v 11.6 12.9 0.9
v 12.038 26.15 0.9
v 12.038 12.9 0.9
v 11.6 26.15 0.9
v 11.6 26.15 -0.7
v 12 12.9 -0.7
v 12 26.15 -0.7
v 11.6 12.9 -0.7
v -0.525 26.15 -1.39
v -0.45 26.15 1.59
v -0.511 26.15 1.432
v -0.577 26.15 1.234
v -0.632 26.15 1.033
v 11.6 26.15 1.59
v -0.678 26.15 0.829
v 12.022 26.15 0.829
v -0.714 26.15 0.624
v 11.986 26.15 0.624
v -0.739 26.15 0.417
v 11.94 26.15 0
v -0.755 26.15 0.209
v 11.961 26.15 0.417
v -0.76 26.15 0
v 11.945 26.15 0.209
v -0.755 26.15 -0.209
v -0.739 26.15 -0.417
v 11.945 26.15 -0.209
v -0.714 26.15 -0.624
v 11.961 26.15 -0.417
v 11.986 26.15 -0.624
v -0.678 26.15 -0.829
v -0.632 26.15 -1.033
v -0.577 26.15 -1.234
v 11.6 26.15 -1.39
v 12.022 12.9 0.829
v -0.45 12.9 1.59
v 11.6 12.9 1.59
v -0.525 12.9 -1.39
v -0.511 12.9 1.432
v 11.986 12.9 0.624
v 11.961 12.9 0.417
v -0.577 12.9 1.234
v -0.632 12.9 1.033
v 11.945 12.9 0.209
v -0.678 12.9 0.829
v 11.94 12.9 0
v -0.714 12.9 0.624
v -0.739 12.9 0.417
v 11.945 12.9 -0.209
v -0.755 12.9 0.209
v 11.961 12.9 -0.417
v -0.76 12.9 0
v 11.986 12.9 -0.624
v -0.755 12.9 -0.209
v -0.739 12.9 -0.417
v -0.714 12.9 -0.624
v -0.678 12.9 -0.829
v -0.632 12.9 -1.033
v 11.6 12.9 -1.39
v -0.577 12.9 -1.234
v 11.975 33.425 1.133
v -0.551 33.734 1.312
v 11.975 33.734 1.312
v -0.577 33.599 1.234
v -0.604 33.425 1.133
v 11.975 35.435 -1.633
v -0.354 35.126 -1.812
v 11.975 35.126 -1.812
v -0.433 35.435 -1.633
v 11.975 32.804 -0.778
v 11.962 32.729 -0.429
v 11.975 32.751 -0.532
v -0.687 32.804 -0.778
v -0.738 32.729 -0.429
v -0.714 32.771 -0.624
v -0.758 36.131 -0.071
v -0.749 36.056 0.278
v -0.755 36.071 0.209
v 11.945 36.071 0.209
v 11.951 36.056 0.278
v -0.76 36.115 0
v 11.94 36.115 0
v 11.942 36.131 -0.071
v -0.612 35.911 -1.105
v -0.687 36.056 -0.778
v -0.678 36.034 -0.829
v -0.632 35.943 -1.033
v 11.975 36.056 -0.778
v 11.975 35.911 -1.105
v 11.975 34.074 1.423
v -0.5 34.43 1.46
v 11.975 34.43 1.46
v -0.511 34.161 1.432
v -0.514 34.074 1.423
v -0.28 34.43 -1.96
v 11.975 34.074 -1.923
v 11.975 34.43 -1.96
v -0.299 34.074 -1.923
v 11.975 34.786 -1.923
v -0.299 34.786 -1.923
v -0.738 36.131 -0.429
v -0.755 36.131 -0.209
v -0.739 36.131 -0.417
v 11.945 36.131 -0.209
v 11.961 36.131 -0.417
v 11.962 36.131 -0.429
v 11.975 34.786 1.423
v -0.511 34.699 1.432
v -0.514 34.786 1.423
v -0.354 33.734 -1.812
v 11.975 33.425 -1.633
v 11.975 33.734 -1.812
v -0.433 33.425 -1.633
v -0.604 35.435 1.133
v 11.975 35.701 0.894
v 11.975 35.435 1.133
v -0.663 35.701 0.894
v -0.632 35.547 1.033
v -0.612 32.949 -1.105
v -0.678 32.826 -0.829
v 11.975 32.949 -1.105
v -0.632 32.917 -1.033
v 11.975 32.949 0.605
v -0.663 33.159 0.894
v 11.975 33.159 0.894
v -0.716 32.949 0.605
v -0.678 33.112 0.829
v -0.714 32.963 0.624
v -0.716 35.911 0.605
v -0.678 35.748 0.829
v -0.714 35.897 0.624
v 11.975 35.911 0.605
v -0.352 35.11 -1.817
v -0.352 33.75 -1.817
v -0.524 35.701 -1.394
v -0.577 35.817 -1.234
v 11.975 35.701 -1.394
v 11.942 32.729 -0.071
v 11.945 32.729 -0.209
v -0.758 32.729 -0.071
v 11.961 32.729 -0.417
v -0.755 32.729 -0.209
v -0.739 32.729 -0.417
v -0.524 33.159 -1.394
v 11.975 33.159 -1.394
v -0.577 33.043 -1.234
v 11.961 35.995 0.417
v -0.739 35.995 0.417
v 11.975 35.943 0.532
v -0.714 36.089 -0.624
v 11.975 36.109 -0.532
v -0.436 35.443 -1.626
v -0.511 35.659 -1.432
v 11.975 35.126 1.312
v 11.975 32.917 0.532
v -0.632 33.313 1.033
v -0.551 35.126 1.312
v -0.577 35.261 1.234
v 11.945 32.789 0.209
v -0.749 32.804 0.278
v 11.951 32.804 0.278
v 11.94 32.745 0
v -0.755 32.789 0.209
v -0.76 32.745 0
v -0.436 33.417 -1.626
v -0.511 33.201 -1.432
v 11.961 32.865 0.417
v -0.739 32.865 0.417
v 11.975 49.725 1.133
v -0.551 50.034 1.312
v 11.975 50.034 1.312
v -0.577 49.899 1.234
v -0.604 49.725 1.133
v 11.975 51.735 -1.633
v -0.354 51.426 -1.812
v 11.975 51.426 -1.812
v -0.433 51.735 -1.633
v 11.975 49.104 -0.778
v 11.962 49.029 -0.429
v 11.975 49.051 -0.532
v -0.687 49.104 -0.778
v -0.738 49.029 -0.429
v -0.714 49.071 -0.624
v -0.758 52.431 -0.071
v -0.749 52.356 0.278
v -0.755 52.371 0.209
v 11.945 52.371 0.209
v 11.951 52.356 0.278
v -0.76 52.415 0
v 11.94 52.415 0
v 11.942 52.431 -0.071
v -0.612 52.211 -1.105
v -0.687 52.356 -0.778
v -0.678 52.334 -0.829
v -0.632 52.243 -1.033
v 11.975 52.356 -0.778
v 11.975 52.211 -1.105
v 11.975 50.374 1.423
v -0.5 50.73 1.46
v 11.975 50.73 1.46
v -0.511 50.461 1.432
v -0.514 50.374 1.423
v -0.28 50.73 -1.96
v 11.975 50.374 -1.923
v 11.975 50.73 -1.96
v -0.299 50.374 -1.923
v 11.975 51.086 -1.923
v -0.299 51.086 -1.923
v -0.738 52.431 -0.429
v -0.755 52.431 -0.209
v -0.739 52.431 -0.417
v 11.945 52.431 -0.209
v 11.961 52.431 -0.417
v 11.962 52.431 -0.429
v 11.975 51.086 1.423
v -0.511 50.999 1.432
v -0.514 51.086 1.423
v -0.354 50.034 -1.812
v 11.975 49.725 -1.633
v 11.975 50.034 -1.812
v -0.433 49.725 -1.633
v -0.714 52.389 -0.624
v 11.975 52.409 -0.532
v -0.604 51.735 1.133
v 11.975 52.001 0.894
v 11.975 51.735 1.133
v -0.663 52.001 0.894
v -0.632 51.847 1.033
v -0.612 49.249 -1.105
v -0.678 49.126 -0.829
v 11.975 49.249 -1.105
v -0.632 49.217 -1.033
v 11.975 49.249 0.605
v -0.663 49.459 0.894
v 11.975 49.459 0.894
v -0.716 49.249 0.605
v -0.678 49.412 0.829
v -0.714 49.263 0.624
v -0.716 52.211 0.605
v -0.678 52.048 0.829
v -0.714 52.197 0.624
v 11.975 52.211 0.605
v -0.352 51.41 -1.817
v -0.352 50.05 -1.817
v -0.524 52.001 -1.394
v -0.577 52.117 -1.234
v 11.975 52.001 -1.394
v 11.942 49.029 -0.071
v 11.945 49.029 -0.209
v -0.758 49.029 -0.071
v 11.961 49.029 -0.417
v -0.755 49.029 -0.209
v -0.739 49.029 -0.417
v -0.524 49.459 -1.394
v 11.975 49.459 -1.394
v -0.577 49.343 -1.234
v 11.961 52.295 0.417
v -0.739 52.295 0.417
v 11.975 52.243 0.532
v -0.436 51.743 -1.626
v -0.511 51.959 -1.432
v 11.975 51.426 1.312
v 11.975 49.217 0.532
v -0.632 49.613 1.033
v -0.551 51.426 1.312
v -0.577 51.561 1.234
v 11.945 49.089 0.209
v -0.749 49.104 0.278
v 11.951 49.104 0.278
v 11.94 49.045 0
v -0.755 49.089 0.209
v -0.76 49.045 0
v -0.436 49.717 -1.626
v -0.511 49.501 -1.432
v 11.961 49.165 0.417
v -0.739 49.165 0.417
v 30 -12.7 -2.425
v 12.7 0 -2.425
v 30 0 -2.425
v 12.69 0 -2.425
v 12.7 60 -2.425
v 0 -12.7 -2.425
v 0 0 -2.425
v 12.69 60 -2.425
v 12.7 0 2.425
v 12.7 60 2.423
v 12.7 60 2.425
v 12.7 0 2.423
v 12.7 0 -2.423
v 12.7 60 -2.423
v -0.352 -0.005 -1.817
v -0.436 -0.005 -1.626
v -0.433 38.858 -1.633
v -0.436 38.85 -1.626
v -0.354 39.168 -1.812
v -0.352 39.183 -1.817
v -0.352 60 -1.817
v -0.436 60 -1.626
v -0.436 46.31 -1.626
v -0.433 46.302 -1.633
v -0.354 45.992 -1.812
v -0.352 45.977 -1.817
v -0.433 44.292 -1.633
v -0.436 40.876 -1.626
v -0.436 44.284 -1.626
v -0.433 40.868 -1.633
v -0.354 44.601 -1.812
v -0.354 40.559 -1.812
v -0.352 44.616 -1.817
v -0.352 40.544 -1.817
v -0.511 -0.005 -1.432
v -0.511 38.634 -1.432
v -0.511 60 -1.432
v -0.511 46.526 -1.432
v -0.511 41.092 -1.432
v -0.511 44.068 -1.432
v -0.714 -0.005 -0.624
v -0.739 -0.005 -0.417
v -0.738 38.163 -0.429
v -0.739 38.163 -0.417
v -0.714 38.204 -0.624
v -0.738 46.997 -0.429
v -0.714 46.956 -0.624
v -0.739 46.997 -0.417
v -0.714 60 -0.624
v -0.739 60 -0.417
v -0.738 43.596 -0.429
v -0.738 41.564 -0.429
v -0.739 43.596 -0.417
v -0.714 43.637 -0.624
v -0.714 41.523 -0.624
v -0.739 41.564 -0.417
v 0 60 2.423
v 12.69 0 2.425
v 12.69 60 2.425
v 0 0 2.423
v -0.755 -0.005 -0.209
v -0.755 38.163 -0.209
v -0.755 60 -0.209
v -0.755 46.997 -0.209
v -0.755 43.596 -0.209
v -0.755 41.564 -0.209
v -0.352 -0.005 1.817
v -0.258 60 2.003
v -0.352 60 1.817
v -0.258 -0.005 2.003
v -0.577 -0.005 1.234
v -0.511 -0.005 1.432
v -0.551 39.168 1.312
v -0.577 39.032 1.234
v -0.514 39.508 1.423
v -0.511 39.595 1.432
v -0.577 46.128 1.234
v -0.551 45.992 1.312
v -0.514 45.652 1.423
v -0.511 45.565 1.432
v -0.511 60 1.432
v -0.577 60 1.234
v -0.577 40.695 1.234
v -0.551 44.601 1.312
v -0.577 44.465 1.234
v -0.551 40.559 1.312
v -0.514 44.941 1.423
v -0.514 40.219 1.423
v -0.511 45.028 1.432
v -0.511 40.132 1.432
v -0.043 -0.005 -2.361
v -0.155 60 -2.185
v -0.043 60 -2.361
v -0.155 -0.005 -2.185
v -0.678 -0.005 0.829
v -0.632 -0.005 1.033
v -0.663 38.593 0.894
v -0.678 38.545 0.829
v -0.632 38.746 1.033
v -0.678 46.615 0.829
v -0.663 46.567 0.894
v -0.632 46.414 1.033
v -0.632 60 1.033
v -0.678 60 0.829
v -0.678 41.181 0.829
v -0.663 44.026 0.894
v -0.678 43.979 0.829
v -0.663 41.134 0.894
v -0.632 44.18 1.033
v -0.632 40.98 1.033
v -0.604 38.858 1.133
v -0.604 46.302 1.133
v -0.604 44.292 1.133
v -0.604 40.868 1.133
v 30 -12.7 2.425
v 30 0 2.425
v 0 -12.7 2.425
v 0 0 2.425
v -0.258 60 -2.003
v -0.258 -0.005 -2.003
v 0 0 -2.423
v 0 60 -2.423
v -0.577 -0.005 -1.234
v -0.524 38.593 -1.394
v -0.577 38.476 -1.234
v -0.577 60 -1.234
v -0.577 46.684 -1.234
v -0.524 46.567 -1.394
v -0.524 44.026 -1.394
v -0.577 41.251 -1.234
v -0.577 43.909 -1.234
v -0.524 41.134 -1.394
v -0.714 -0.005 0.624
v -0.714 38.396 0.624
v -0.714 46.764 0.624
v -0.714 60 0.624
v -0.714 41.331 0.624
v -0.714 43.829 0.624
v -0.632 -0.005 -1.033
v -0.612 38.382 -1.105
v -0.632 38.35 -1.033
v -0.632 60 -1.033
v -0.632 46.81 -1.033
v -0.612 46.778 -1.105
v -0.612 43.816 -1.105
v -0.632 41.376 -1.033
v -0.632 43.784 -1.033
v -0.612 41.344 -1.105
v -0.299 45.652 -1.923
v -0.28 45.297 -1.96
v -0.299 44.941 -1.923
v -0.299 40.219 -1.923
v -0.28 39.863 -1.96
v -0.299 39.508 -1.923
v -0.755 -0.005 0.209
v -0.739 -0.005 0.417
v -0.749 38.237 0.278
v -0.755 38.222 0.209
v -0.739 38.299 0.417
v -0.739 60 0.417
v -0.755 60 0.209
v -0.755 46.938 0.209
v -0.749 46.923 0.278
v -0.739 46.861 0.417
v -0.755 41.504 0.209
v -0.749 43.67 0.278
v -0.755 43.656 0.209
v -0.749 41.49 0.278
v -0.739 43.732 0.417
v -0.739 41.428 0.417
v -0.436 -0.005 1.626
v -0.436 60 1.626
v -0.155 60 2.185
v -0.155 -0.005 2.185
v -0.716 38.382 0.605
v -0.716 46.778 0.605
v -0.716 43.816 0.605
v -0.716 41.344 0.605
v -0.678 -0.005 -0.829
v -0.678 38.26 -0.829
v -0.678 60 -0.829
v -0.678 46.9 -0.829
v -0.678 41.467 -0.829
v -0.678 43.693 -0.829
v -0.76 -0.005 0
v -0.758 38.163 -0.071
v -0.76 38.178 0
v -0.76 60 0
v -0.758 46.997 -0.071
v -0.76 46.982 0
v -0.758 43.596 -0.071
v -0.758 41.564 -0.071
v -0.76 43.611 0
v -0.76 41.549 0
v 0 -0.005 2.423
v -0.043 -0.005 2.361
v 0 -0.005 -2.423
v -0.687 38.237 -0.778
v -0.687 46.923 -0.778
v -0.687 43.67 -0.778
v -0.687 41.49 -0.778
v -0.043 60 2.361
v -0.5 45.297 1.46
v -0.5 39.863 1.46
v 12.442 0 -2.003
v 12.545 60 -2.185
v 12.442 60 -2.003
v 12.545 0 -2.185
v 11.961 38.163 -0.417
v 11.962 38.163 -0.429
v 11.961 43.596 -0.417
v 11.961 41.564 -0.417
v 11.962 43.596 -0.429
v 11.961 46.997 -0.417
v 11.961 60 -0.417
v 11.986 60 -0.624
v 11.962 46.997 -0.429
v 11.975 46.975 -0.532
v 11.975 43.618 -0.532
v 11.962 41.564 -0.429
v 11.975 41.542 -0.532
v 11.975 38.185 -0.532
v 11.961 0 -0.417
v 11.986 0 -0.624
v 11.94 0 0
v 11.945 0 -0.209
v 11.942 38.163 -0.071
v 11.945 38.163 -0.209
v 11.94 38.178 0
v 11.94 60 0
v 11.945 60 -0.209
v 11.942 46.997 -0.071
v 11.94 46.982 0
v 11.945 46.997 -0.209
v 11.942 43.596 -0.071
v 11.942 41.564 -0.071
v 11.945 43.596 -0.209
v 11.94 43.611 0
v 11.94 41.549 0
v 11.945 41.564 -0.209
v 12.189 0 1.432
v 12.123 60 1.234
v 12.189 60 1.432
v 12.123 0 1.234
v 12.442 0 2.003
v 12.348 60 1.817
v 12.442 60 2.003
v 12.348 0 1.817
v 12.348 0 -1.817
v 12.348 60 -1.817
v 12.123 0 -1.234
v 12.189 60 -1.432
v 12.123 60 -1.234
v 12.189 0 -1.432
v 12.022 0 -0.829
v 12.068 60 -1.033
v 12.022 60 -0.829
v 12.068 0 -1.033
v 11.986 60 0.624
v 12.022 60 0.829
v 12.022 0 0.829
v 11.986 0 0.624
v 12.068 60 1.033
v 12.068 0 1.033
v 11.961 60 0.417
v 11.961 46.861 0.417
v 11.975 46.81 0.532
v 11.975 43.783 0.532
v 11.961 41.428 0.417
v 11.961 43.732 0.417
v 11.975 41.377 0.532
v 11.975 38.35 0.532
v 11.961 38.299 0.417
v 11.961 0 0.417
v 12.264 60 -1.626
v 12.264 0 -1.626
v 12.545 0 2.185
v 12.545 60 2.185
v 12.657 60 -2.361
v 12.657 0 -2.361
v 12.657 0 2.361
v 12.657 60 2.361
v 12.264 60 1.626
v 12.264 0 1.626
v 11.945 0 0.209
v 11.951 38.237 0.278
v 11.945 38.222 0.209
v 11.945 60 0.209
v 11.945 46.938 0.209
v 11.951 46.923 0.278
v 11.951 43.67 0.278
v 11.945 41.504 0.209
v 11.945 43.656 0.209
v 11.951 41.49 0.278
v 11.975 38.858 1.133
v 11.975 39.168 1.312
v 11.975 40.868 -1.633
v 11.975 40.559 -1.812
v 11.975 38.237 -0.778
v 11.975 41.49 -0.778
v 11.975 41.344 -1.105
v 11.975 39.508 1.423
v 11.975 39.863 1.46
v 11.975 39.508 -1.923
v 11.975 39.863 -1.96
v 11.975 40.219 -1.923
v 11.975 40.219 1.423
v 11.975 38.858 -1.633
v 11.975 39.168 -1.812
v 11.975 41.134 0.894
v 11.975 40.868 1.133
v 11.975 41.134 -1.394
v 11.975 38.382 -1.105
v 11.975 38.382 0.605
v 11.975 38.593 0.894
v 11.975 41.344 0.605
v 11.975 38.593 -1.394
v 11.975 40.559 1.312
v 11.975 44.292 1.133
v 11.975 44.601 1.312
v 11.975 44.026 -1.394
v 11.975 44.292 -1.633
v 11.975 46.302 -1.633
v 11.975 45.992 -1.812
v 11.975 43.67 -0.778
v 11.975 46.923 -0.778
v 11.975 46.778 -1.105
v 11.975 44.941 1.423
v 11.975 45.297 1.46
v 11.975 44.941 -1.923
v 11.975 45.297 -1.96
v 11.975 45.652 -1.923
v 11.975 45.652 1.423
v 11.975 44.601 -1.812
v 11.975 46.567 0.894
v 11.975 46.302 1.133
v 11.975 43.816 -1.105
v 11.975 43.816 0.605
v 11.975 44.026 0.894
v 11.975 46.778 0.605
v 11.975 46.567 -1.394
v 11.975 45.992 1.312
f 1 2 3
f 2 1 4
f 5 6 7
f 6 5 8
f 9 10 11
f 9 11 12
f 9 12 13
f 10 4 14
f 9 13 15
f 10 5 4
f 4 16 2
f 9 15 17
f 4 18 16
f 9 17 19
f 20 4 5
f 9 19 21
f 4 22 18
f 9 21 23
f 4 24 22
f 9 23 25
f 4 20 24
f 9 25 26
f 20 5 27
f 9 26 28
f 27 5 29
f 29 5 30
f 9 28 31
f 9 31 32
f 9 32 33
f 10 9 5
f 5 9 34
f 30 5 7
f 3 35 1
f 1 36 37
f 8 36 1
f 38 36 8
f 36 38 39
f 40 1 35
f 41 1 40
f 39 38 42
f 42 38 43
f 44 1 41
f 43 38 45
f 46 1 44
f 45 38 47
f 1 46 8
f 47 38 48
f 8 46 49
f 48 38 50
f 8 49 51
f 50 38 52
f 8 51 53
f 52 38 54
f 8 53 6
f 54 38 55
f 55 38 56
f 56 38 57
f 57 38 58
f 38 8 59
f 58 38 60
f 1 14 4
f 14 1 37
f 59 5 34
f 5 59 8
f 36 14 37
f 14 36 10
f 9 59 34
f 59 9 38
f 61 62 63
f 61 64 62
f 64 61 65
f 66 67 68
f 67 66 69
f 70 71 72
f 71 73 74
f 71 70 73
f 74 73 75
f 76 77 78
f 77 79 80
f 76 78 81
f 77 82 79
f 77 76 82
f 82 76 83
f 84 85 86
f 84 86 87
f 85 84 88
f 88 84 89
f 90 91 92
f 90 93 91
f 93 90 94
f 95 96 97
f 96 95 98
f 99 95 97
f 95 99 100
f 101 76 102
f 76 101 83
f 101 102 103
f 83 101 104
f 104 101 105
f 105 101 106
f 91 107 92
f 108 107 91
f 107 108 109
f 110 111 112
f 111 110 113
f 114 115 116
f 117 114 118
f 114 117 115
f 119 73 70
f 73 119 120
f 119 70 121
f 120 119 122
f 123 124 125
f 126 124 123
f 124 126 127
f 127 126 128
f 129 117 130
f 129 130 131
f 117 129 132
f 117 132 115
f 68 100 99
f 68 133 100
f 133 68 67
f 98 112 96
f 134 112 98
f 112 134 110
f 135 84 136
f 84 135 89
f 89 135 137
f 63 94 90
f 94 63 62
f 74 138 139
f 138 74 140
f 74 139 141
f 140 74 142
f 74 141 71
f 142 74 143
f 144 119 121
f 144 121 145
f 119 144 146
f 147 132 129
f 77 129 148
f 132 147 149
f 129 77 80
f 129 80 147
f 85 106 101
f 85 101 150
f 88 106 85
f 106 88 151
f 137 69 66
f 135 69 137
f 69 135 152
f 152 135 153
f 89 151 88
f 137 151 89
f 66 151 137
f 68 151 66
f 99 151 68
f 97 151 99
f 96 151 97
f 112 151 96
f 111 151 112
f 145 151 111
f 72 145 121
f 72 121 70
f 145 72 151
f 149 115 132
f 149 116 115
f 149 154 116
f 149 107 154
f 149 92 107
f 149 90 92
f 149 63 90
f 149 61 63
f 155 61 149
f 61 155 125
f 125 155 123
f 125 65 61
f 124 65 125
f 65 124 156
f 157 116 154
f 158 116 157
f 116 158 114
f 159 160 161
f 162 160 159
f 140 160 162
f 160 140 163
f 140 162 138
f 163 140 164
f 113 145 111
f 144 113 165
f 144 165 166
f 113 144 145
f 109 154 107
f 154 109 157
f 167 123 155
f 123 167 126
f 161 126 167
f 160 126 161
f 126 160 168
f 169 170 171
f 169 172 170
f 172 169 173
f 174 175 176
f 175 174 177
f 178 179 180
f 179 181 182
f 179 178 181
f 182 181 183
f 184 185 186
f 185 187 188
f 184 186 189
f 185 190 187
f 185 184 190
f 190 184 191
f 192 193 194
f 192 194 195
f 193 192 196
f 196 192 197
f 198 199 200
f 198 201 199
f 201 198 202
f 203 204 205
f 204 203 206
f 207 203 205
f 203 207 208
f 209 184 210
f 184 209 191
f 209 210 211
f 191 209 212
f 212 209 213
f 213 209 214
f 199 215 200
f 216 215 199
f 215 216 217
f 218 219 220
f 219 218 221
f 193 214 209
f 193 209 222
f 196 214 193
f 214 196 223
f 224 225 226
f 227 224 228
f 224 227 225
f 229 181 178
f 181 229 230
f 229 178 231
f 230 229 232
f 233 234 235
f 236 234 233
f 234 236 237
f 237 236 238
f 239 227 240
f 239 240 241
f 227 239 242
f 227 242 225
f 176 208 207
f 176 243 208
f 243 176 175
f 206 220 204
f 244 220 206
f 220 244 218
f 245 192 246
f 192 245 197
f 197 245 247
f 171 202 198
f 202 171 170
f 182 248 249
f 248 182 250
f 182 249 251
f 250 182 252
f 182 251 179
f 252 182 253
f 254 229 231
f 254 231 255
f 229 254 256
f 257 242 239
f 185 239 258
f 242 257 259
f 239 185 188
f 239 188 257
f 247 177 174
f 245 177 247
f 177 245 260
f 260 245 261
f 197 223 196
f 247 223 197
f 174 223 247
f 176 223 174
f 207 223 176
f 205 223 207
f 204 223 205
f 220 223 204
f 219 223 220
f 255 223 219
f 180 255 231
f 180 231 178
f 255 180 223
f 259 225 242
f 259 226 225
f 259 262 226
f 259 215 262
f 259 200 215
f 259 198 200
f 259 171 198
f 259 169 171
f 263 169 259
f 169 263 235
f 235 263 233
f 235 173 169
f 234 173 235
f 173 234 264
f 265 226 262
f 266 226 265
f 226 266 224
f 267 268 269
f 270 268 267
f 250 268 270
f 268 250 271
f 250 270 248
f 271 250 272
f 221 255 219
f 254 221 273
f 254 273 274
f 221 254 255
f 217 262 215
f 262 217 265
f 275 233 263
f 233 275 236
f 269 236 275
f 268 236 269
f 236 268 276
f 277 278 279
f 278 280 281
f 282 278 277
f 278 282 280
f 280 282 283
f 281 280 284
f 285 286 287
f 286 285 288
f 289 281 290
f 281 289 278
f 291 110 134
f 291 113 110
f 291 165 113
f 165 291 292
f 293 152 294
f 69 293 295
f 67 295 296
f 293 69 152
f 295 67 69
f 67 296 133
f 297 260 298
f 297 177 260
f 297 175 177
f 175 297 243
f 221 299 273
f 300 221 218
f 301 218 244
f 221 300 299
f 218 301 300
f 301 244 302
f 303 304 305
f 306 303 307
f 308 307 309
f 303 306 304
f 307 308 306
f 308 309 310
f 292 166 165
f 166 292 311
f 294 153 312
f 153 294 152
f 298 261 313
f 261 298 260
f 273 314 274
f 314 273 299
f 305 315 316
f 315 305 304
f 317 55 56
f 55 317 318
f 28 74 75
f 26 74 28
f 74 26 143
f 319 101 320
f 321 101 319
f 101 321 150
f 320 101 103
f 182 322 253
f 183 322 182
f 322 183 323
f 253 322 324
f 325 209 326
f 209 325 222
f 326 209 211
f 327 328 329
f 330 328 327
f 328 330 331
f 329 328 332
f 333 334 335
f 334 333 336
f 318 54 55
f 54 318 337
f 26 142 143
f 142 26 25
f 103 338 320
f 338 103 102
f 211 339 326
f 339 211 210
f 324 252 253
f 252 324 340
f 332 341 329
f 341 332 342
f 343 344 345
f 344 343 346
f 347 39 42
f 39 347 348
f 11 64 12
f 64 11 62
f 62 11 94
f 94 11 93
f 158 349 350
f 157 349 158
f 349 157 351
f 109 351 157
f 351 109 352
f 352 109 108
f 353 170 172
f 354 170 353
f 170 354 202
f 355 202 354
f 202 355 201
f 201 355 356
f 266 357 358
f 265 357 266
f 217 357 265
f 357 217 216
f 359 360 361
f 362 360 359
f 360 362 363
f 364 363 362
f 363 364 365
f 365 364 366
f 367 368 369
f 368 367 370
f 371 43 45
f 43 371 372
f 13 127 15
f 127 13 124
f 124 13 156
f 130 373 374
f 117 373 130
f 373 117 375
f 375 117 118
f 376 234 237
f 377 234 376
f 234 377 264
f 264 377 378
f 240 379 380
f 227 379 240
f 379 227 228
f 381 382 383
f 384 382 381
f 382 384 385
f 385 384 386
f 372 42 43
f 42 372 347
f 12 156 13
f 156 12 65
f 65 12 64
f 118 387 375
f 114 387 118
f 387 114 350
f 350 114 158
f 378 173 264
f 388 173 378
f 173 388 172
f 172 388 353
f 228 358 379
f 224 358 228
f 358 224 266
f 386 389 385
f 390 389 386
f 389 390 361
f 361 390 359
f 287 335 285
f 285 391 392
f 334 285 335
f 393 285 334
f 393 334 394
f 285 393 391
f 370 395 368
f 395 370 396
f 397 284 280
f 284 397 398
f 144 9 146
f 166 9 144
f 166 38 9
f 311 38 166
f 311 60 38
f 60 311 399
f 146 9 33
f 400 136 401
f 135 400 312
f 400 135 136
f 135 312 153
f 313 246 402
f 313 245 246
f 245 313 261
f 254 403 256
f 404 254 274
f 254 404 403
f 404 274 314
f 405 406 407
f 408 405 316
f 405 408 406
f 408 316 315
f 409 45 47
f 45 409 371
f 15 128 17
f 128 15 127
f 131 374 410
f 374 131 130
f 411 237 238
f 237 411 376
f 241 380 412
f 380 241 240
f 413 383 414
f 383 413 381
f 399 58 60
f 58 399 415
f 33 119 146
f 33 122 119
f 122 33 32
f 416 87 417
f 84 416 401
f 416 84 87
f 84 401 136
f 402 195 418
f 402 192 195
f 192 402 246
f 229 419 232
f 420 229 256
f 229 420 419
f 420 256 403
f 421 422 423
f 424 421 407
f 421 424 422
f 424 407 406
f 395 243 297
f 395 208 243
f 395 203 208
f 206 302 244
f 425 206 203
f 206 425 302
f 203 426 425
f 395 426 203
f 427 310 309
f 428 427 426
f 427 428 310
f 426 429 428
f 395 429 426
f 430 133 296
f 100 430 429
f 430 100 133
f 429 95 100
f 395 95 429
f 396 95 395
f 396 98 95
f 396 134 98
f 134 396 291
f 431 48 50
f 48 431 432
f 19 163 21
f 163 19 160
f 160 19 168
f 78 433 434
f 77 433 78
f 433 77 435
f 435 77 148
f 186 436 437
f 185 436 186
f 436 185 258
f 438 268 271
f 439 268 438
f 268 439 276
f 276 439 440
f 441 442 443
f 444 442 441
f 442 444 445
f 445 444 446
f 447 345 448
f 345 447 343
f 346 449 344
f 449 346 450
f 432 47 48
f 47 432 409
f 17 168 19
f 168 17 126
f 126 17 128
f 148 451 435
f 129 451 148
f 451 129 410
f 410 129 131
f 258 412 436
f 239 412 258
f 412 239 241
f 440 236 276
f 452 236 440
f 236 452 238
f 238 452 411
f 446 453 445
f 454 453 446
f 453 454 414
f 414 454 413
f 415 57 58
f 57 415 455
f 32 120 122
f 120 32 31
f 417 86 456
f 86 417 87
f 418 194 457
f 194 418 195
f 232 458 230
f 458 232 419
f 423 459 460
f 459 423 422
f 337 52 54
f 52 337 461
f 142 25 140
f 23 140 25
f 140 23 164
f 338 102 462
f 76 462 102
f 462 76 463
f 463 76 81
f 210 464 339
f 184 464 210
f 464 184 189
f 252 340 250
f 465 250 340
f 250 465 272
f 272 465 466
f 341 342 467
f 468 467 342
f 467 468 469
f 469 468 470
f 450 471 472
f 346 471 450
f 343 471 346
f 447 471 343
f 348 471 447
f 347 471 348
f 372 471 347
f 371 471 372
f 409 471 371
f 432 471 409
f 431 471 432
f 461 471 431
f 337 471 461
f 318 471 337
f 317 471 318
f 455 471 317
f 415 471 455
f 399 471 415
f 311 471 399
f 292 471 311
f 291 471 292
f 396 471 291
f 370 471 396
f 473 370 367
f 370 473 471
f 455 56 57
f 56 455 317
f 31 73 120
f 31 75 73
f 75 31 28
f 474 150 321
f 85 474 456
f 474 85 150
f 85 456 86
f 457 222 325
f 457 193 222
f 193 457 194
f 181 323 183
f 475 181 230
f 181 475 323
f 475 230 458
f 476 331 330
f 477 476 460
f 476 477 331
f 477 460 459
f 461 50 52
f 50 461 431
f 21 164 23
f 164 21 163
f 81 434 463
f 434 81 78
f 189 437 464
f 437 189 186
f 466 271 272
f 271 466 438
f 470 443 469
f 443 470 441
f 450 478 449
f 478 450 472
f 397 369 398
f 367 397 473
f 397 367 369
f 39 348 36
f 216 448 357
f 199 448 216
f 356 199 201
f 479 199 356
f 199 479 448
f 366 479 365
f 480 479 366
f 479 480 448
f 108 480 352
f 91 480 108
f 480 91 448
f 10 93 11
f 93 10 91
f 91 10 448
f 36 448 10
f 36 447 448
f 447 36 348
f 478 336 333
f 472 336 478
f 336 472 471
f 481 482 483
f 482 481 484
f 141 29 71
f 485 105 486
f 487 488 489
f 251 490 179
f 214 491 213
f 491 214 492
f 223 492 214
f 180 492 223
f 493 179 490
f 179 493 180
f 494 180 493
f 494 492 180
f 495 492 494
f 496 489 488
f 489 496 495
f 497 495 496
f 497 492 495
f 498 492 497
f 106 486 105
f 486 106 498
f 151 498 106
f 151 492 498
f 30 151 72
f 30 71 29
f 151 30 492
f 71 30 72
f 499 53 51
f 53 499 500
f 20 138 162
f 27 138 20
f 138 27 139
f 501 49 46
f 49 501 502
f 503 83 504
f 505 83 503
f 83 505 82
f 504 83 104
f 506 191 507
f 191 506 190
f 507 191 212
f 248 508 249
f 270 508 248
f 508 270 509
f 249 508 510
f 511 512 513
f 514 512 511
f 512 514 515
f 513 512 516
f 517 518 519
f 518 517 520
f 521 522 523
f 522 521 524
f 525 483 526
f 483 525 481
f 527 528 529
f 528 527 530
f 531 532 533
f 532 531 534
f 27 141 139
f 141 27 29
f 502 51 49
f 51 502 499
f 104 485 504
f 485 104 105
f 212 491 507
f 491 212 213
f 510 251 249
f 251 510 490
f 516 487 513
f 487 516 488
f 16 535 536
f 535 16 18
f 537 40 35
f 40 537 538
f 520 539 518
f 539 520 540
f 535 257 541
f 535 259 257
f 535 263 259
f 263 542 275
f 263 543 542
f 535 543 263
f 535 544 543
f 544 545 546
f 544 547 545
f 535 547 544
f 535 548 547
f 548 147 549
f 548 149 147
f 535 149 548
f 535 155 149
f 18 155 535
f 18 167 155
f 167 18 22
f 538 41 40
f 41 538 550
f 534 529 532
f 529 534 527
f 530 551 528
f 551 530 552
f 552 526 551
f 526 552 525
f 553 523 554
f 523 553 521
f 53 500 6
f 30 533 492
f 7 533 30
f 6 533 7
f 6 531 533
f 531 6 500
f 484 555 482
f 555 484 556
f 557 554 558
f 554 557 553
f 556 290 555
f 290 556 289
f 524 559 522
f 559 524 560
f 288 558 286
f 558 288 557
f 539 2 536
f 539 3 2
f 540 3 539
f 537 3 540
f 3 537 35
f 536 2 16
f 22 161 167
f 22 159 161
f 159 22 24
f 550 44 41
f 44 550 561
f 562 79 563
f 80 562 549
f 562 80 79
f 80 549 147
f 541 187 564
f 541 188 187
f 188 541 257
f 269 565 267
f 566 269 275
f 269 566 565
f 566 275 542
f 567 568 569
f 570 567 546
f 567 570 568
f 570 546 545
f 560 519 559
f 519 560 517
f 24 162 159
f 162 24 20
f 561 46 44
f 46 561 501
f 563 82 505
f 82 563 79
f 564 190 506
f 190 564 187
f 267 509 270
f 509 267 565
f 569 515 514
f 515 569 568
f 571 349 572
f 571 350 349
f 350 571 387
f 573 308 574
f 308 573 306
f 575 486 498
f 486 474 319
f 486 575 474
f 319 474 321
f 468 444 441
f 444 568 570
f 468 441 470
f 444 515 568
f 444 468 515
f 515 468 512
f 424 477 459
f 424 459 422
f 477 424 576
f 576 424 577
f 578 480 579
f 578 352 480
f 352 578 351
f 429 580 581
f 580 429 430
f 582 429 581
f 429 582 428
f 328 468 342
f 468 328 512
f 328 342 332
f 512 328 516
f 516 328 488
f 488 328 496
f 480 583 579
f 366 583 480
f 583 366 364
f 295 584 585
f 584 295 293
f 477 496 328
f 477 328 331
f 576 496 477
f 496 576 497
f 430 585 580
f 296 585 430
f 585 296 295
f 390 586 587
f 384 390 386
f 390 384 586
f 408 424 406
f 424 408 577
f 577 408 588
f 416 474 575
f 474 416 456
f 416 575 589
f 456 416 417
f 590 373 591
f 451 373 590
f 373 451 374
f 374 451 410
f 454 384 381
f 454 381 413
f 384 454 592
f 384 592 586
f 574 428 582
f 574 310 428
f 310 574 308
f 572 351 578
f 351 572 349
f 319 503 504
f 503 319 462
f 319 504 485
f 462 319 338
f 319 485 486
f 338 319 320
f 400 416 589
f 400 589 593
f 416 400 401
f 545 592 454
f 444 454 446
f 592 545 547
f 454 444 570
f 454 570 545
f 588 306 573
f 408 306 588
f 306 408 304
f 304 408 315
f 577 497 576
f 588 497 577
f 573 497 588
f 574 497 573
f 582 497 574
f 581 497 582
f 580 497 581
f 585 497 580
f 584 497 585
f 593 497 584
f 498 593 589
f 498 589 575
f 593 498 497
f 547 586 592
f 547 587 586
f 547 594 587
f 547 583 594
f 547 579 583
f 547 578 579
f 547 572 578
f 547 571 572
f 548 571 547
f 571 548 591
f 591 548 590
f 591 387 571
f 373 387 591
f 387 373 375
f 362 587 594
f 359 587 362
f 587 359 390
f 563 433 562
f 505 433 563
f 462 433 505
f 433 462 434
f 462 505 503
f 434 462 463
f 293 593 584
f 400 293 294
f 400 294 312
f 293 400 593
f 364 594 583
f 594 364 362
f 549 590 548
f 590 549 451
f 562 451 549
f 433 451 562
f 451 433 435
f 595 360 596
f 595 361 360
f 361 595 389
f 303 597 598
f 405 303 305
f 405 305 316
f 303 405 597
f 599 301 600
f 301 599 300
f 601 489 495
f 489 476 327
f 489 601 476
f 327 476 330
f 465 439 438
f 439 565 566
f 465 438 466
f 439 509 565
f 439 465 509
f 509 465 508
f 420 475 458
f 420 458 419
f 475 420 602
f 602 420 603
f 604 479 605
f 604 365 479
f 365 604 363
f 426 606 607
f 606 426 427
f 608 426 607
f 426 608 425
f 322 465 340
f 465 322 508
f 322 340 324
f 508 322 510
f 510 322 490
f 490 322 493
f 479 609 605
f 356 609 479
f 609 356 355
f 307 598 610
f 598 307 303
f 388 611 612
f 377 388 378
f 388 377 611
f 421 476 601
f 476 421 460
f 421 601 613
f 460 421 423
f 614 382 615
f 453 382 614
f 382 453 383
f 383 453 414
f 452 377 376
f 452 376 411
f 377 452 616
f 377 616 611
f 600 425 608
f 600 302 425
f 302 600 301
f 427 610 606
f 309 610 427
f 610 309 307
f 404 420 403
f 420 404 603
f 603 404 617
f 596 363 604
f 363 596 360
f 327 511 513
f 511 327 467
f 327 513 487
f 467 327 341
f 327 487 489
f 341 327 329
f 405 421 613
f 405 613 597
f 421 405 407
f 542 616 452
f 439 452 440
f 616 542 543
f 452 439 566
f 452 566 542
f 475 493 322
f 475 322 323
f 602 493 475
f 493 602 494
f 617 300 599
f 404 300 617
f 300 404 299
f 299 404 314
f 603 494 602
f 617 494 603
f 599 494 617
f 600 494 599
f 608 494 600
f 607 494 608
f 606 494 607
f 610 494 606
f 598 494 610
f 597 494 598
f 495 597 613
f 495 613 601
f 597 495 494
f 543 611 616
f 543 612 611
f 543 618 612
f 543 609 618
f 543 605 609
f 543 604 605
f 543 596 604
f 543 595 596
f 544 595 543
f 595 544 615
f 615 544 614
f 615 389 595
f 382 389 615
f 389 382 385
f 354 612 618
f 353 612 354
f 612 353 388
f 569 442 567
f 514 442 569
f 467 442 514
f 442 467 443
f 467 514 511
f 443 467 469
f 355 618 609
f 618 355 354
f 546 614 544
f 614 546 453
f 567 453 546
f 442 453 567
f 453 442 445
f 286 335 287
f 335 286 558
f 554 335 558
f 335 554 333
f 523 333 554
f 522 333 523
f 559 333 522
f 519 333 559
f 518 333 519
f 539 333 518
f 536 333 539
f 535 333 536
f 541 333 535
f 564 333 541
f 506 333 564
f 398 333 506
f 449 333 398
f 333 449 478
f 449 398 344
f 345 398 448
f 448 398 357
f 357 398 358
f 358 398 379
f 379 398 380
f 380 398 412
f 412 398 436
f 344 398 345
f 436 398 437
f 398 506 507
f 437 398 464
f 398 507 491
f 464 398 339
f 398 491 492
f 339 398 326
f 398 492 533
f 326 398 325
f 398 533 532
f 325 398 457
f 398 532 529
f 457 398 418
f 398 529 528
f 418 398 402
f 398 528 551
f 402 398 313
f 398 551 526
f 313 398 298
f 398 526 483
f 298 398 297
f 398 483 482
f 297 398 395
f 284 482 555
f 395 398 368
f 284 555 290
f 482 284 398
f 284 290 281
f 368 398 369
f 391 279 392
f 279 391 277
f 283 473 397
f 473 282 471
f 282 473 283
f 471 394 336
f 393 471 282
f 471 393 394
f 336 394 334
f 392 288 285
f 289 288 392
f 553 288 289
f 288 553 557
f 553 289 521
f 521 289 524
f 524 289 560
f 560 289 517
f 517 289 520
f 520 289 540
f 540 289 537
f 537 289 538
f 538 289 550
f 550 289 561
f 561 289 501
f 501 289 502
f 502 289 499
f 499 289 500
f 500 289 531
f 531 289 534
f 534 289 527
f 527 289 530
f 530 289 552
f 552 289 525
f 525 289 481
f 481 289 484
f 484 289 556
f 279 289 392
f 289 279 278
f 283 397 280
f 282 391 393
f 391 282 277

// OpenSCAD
MM_PER_IN = 25.4;
RESOLUTION = 0.01; // 0.01 mm slices (too small to matter)
PRINT_TOLERANCE = 0.15; // mm

RIB_WIDTH = MM_PER_IN / 2; // 1/4" in mm
RM2_LENGTH = 246; // mm
RM2_THICKNESS = 4.7 + PRINT_TOLERANCE; // mm
RM2_CURVE_RAD = 4.25; // mm

module genCurveShape(
    radius = RM2_CURVE_RAD,
    height = RM2_THICKNESS,
    thickness = RESOLUTION,
  ) {

  width = radius - sqrt(pow(radius, 2) - pow((height / 2), 2));

  rotate([90,0,0])
  // "center" the part 3-dimensionally
  translate([radius - (width), 0, -thickness / 2])
  linear_extrude(thickness)
  intersection() {
    circle(r=radius, $fn = 128, center = true);
    translate([-radius + width / 2, 0, 0])
      square(size = [width, height], center = true);
  }
}

// Not currently used
module genInverseCurveShape(
    radius = RM2_CURVE_RAD,
    height = RM2_THICKNESS
  ) {

  width = radius - sqrt(pow(radius, 2) - pow((height / 2), 2));

  difference(){
    cube(size = [width, RESOLUTION, RM2_THICKNESS], center = true);
    translate([width/2, 0, 0])
    genCurveShape(radius, height);
  }
}


pogoPinL = 13.25;
pogoPinH = 2.78;
pogoPinW = RIB_WIDTH;
pinsH = 1.6;
pinsStickout = 1.5;
bridgeCompensation = .2;
module Pogo8212200510001101Slot(){
    translate([pinsStickout,0,((pogoPinH+bridgeCompensation)/2)-pinsH/2])
    cube([pogoPinW,pogoPinL,pinsH]);
    cube([pogoPinW,pogoPinL,pogoPinH+bridgeCompensation]);
}

magnetL = 13.5;
magnetD = 3.22;
magnetTol = .2;
$fs = RESOLUTION;
module magnetHole(){ //TODO: make this not centered (magnets not centered up/down)
    rotate([0,90,0])
    translate([.25,0,-magnetL+RIB_WIDTH-.725]) // -.7** makes them not go all the way through
    cylinder(d=magnetD+magnetTol, h=magnetL);
}

INTERMAGNET_DIST = 16.3;
module magnetHoles(bottomLoc){
    // translation of bottom one (closest to USB-C cable)
    translate([0,bottomLoc,0])
    magnetHole();
    // location of top one is fixed
    topLoc = bottomLoc + INTERMAGNET_DIST;
    translate([0,topLoc,0])
    magnetHole();
}

echo(str("Rib width in mm: ", RIB_WIDTH));

difference(){
  hull(){
    #genCurveShape();

    translate([0, RM2_LENGTH, 0])
    genCurveShape();

    translate([RIB_WIDTH - RESOLUTION / 2, 0, 0])
    cube(size=[RESOLUTION, RESOLUTION, RM2_THICKNESS], center = true);

    translate([RIB_WIDTH - RESOLUTION / 2, RM2_LENGTH, 0])
    cube(size=[RESOLUTION, RESOLUTION, RM2_THICKNESS], center = true);
  }

  translate([RIB_WIDTH, 0, 0])
  hull(){
    genCurveShape();

    translate([0, RM2_LENGTH, 0])
    genCurveShape();
  }
  
  PINNY_STICKOUTY = .4;
  distanceFromUSBside = 12.9;
  translate([-pogoPinW-pinsStickout+PINNY_STICKOUTY+RIB_WIDTH,distanceFromUSBside,-pogoPinH/2])
  Pogo8212200510001101Slot();

  magnetHoles(34.43);
  magnetHoles(RM2_LENGTH-16.47-INTERMAGNET_DIST);

  // extra holes test
  translate([0,(34.43 + (INTERMAGNET_DIST / 3)),0])
  magnetHole();
  translate([0,(34.43 + (INTERMAGNET_DIST * (2/3) )),0])
  magnetHole();

  // TESTING PIECES
  // Cut in half
  translate([-10,60,-10])
  cube([30,530,30]);
}

// add stops
translate([30/2,-RIB_WIDTH/2,0])
cube([30,RIB_WIDTH,RM2_THICKNESS], center = true);

//translate([30/2,(-RIB_WIDTH/2)+RM2_LENGTH+RIB_WIDTH,0])
//cube([30,RIB_WIDTH,RM2_THICKNESS], center = true);
